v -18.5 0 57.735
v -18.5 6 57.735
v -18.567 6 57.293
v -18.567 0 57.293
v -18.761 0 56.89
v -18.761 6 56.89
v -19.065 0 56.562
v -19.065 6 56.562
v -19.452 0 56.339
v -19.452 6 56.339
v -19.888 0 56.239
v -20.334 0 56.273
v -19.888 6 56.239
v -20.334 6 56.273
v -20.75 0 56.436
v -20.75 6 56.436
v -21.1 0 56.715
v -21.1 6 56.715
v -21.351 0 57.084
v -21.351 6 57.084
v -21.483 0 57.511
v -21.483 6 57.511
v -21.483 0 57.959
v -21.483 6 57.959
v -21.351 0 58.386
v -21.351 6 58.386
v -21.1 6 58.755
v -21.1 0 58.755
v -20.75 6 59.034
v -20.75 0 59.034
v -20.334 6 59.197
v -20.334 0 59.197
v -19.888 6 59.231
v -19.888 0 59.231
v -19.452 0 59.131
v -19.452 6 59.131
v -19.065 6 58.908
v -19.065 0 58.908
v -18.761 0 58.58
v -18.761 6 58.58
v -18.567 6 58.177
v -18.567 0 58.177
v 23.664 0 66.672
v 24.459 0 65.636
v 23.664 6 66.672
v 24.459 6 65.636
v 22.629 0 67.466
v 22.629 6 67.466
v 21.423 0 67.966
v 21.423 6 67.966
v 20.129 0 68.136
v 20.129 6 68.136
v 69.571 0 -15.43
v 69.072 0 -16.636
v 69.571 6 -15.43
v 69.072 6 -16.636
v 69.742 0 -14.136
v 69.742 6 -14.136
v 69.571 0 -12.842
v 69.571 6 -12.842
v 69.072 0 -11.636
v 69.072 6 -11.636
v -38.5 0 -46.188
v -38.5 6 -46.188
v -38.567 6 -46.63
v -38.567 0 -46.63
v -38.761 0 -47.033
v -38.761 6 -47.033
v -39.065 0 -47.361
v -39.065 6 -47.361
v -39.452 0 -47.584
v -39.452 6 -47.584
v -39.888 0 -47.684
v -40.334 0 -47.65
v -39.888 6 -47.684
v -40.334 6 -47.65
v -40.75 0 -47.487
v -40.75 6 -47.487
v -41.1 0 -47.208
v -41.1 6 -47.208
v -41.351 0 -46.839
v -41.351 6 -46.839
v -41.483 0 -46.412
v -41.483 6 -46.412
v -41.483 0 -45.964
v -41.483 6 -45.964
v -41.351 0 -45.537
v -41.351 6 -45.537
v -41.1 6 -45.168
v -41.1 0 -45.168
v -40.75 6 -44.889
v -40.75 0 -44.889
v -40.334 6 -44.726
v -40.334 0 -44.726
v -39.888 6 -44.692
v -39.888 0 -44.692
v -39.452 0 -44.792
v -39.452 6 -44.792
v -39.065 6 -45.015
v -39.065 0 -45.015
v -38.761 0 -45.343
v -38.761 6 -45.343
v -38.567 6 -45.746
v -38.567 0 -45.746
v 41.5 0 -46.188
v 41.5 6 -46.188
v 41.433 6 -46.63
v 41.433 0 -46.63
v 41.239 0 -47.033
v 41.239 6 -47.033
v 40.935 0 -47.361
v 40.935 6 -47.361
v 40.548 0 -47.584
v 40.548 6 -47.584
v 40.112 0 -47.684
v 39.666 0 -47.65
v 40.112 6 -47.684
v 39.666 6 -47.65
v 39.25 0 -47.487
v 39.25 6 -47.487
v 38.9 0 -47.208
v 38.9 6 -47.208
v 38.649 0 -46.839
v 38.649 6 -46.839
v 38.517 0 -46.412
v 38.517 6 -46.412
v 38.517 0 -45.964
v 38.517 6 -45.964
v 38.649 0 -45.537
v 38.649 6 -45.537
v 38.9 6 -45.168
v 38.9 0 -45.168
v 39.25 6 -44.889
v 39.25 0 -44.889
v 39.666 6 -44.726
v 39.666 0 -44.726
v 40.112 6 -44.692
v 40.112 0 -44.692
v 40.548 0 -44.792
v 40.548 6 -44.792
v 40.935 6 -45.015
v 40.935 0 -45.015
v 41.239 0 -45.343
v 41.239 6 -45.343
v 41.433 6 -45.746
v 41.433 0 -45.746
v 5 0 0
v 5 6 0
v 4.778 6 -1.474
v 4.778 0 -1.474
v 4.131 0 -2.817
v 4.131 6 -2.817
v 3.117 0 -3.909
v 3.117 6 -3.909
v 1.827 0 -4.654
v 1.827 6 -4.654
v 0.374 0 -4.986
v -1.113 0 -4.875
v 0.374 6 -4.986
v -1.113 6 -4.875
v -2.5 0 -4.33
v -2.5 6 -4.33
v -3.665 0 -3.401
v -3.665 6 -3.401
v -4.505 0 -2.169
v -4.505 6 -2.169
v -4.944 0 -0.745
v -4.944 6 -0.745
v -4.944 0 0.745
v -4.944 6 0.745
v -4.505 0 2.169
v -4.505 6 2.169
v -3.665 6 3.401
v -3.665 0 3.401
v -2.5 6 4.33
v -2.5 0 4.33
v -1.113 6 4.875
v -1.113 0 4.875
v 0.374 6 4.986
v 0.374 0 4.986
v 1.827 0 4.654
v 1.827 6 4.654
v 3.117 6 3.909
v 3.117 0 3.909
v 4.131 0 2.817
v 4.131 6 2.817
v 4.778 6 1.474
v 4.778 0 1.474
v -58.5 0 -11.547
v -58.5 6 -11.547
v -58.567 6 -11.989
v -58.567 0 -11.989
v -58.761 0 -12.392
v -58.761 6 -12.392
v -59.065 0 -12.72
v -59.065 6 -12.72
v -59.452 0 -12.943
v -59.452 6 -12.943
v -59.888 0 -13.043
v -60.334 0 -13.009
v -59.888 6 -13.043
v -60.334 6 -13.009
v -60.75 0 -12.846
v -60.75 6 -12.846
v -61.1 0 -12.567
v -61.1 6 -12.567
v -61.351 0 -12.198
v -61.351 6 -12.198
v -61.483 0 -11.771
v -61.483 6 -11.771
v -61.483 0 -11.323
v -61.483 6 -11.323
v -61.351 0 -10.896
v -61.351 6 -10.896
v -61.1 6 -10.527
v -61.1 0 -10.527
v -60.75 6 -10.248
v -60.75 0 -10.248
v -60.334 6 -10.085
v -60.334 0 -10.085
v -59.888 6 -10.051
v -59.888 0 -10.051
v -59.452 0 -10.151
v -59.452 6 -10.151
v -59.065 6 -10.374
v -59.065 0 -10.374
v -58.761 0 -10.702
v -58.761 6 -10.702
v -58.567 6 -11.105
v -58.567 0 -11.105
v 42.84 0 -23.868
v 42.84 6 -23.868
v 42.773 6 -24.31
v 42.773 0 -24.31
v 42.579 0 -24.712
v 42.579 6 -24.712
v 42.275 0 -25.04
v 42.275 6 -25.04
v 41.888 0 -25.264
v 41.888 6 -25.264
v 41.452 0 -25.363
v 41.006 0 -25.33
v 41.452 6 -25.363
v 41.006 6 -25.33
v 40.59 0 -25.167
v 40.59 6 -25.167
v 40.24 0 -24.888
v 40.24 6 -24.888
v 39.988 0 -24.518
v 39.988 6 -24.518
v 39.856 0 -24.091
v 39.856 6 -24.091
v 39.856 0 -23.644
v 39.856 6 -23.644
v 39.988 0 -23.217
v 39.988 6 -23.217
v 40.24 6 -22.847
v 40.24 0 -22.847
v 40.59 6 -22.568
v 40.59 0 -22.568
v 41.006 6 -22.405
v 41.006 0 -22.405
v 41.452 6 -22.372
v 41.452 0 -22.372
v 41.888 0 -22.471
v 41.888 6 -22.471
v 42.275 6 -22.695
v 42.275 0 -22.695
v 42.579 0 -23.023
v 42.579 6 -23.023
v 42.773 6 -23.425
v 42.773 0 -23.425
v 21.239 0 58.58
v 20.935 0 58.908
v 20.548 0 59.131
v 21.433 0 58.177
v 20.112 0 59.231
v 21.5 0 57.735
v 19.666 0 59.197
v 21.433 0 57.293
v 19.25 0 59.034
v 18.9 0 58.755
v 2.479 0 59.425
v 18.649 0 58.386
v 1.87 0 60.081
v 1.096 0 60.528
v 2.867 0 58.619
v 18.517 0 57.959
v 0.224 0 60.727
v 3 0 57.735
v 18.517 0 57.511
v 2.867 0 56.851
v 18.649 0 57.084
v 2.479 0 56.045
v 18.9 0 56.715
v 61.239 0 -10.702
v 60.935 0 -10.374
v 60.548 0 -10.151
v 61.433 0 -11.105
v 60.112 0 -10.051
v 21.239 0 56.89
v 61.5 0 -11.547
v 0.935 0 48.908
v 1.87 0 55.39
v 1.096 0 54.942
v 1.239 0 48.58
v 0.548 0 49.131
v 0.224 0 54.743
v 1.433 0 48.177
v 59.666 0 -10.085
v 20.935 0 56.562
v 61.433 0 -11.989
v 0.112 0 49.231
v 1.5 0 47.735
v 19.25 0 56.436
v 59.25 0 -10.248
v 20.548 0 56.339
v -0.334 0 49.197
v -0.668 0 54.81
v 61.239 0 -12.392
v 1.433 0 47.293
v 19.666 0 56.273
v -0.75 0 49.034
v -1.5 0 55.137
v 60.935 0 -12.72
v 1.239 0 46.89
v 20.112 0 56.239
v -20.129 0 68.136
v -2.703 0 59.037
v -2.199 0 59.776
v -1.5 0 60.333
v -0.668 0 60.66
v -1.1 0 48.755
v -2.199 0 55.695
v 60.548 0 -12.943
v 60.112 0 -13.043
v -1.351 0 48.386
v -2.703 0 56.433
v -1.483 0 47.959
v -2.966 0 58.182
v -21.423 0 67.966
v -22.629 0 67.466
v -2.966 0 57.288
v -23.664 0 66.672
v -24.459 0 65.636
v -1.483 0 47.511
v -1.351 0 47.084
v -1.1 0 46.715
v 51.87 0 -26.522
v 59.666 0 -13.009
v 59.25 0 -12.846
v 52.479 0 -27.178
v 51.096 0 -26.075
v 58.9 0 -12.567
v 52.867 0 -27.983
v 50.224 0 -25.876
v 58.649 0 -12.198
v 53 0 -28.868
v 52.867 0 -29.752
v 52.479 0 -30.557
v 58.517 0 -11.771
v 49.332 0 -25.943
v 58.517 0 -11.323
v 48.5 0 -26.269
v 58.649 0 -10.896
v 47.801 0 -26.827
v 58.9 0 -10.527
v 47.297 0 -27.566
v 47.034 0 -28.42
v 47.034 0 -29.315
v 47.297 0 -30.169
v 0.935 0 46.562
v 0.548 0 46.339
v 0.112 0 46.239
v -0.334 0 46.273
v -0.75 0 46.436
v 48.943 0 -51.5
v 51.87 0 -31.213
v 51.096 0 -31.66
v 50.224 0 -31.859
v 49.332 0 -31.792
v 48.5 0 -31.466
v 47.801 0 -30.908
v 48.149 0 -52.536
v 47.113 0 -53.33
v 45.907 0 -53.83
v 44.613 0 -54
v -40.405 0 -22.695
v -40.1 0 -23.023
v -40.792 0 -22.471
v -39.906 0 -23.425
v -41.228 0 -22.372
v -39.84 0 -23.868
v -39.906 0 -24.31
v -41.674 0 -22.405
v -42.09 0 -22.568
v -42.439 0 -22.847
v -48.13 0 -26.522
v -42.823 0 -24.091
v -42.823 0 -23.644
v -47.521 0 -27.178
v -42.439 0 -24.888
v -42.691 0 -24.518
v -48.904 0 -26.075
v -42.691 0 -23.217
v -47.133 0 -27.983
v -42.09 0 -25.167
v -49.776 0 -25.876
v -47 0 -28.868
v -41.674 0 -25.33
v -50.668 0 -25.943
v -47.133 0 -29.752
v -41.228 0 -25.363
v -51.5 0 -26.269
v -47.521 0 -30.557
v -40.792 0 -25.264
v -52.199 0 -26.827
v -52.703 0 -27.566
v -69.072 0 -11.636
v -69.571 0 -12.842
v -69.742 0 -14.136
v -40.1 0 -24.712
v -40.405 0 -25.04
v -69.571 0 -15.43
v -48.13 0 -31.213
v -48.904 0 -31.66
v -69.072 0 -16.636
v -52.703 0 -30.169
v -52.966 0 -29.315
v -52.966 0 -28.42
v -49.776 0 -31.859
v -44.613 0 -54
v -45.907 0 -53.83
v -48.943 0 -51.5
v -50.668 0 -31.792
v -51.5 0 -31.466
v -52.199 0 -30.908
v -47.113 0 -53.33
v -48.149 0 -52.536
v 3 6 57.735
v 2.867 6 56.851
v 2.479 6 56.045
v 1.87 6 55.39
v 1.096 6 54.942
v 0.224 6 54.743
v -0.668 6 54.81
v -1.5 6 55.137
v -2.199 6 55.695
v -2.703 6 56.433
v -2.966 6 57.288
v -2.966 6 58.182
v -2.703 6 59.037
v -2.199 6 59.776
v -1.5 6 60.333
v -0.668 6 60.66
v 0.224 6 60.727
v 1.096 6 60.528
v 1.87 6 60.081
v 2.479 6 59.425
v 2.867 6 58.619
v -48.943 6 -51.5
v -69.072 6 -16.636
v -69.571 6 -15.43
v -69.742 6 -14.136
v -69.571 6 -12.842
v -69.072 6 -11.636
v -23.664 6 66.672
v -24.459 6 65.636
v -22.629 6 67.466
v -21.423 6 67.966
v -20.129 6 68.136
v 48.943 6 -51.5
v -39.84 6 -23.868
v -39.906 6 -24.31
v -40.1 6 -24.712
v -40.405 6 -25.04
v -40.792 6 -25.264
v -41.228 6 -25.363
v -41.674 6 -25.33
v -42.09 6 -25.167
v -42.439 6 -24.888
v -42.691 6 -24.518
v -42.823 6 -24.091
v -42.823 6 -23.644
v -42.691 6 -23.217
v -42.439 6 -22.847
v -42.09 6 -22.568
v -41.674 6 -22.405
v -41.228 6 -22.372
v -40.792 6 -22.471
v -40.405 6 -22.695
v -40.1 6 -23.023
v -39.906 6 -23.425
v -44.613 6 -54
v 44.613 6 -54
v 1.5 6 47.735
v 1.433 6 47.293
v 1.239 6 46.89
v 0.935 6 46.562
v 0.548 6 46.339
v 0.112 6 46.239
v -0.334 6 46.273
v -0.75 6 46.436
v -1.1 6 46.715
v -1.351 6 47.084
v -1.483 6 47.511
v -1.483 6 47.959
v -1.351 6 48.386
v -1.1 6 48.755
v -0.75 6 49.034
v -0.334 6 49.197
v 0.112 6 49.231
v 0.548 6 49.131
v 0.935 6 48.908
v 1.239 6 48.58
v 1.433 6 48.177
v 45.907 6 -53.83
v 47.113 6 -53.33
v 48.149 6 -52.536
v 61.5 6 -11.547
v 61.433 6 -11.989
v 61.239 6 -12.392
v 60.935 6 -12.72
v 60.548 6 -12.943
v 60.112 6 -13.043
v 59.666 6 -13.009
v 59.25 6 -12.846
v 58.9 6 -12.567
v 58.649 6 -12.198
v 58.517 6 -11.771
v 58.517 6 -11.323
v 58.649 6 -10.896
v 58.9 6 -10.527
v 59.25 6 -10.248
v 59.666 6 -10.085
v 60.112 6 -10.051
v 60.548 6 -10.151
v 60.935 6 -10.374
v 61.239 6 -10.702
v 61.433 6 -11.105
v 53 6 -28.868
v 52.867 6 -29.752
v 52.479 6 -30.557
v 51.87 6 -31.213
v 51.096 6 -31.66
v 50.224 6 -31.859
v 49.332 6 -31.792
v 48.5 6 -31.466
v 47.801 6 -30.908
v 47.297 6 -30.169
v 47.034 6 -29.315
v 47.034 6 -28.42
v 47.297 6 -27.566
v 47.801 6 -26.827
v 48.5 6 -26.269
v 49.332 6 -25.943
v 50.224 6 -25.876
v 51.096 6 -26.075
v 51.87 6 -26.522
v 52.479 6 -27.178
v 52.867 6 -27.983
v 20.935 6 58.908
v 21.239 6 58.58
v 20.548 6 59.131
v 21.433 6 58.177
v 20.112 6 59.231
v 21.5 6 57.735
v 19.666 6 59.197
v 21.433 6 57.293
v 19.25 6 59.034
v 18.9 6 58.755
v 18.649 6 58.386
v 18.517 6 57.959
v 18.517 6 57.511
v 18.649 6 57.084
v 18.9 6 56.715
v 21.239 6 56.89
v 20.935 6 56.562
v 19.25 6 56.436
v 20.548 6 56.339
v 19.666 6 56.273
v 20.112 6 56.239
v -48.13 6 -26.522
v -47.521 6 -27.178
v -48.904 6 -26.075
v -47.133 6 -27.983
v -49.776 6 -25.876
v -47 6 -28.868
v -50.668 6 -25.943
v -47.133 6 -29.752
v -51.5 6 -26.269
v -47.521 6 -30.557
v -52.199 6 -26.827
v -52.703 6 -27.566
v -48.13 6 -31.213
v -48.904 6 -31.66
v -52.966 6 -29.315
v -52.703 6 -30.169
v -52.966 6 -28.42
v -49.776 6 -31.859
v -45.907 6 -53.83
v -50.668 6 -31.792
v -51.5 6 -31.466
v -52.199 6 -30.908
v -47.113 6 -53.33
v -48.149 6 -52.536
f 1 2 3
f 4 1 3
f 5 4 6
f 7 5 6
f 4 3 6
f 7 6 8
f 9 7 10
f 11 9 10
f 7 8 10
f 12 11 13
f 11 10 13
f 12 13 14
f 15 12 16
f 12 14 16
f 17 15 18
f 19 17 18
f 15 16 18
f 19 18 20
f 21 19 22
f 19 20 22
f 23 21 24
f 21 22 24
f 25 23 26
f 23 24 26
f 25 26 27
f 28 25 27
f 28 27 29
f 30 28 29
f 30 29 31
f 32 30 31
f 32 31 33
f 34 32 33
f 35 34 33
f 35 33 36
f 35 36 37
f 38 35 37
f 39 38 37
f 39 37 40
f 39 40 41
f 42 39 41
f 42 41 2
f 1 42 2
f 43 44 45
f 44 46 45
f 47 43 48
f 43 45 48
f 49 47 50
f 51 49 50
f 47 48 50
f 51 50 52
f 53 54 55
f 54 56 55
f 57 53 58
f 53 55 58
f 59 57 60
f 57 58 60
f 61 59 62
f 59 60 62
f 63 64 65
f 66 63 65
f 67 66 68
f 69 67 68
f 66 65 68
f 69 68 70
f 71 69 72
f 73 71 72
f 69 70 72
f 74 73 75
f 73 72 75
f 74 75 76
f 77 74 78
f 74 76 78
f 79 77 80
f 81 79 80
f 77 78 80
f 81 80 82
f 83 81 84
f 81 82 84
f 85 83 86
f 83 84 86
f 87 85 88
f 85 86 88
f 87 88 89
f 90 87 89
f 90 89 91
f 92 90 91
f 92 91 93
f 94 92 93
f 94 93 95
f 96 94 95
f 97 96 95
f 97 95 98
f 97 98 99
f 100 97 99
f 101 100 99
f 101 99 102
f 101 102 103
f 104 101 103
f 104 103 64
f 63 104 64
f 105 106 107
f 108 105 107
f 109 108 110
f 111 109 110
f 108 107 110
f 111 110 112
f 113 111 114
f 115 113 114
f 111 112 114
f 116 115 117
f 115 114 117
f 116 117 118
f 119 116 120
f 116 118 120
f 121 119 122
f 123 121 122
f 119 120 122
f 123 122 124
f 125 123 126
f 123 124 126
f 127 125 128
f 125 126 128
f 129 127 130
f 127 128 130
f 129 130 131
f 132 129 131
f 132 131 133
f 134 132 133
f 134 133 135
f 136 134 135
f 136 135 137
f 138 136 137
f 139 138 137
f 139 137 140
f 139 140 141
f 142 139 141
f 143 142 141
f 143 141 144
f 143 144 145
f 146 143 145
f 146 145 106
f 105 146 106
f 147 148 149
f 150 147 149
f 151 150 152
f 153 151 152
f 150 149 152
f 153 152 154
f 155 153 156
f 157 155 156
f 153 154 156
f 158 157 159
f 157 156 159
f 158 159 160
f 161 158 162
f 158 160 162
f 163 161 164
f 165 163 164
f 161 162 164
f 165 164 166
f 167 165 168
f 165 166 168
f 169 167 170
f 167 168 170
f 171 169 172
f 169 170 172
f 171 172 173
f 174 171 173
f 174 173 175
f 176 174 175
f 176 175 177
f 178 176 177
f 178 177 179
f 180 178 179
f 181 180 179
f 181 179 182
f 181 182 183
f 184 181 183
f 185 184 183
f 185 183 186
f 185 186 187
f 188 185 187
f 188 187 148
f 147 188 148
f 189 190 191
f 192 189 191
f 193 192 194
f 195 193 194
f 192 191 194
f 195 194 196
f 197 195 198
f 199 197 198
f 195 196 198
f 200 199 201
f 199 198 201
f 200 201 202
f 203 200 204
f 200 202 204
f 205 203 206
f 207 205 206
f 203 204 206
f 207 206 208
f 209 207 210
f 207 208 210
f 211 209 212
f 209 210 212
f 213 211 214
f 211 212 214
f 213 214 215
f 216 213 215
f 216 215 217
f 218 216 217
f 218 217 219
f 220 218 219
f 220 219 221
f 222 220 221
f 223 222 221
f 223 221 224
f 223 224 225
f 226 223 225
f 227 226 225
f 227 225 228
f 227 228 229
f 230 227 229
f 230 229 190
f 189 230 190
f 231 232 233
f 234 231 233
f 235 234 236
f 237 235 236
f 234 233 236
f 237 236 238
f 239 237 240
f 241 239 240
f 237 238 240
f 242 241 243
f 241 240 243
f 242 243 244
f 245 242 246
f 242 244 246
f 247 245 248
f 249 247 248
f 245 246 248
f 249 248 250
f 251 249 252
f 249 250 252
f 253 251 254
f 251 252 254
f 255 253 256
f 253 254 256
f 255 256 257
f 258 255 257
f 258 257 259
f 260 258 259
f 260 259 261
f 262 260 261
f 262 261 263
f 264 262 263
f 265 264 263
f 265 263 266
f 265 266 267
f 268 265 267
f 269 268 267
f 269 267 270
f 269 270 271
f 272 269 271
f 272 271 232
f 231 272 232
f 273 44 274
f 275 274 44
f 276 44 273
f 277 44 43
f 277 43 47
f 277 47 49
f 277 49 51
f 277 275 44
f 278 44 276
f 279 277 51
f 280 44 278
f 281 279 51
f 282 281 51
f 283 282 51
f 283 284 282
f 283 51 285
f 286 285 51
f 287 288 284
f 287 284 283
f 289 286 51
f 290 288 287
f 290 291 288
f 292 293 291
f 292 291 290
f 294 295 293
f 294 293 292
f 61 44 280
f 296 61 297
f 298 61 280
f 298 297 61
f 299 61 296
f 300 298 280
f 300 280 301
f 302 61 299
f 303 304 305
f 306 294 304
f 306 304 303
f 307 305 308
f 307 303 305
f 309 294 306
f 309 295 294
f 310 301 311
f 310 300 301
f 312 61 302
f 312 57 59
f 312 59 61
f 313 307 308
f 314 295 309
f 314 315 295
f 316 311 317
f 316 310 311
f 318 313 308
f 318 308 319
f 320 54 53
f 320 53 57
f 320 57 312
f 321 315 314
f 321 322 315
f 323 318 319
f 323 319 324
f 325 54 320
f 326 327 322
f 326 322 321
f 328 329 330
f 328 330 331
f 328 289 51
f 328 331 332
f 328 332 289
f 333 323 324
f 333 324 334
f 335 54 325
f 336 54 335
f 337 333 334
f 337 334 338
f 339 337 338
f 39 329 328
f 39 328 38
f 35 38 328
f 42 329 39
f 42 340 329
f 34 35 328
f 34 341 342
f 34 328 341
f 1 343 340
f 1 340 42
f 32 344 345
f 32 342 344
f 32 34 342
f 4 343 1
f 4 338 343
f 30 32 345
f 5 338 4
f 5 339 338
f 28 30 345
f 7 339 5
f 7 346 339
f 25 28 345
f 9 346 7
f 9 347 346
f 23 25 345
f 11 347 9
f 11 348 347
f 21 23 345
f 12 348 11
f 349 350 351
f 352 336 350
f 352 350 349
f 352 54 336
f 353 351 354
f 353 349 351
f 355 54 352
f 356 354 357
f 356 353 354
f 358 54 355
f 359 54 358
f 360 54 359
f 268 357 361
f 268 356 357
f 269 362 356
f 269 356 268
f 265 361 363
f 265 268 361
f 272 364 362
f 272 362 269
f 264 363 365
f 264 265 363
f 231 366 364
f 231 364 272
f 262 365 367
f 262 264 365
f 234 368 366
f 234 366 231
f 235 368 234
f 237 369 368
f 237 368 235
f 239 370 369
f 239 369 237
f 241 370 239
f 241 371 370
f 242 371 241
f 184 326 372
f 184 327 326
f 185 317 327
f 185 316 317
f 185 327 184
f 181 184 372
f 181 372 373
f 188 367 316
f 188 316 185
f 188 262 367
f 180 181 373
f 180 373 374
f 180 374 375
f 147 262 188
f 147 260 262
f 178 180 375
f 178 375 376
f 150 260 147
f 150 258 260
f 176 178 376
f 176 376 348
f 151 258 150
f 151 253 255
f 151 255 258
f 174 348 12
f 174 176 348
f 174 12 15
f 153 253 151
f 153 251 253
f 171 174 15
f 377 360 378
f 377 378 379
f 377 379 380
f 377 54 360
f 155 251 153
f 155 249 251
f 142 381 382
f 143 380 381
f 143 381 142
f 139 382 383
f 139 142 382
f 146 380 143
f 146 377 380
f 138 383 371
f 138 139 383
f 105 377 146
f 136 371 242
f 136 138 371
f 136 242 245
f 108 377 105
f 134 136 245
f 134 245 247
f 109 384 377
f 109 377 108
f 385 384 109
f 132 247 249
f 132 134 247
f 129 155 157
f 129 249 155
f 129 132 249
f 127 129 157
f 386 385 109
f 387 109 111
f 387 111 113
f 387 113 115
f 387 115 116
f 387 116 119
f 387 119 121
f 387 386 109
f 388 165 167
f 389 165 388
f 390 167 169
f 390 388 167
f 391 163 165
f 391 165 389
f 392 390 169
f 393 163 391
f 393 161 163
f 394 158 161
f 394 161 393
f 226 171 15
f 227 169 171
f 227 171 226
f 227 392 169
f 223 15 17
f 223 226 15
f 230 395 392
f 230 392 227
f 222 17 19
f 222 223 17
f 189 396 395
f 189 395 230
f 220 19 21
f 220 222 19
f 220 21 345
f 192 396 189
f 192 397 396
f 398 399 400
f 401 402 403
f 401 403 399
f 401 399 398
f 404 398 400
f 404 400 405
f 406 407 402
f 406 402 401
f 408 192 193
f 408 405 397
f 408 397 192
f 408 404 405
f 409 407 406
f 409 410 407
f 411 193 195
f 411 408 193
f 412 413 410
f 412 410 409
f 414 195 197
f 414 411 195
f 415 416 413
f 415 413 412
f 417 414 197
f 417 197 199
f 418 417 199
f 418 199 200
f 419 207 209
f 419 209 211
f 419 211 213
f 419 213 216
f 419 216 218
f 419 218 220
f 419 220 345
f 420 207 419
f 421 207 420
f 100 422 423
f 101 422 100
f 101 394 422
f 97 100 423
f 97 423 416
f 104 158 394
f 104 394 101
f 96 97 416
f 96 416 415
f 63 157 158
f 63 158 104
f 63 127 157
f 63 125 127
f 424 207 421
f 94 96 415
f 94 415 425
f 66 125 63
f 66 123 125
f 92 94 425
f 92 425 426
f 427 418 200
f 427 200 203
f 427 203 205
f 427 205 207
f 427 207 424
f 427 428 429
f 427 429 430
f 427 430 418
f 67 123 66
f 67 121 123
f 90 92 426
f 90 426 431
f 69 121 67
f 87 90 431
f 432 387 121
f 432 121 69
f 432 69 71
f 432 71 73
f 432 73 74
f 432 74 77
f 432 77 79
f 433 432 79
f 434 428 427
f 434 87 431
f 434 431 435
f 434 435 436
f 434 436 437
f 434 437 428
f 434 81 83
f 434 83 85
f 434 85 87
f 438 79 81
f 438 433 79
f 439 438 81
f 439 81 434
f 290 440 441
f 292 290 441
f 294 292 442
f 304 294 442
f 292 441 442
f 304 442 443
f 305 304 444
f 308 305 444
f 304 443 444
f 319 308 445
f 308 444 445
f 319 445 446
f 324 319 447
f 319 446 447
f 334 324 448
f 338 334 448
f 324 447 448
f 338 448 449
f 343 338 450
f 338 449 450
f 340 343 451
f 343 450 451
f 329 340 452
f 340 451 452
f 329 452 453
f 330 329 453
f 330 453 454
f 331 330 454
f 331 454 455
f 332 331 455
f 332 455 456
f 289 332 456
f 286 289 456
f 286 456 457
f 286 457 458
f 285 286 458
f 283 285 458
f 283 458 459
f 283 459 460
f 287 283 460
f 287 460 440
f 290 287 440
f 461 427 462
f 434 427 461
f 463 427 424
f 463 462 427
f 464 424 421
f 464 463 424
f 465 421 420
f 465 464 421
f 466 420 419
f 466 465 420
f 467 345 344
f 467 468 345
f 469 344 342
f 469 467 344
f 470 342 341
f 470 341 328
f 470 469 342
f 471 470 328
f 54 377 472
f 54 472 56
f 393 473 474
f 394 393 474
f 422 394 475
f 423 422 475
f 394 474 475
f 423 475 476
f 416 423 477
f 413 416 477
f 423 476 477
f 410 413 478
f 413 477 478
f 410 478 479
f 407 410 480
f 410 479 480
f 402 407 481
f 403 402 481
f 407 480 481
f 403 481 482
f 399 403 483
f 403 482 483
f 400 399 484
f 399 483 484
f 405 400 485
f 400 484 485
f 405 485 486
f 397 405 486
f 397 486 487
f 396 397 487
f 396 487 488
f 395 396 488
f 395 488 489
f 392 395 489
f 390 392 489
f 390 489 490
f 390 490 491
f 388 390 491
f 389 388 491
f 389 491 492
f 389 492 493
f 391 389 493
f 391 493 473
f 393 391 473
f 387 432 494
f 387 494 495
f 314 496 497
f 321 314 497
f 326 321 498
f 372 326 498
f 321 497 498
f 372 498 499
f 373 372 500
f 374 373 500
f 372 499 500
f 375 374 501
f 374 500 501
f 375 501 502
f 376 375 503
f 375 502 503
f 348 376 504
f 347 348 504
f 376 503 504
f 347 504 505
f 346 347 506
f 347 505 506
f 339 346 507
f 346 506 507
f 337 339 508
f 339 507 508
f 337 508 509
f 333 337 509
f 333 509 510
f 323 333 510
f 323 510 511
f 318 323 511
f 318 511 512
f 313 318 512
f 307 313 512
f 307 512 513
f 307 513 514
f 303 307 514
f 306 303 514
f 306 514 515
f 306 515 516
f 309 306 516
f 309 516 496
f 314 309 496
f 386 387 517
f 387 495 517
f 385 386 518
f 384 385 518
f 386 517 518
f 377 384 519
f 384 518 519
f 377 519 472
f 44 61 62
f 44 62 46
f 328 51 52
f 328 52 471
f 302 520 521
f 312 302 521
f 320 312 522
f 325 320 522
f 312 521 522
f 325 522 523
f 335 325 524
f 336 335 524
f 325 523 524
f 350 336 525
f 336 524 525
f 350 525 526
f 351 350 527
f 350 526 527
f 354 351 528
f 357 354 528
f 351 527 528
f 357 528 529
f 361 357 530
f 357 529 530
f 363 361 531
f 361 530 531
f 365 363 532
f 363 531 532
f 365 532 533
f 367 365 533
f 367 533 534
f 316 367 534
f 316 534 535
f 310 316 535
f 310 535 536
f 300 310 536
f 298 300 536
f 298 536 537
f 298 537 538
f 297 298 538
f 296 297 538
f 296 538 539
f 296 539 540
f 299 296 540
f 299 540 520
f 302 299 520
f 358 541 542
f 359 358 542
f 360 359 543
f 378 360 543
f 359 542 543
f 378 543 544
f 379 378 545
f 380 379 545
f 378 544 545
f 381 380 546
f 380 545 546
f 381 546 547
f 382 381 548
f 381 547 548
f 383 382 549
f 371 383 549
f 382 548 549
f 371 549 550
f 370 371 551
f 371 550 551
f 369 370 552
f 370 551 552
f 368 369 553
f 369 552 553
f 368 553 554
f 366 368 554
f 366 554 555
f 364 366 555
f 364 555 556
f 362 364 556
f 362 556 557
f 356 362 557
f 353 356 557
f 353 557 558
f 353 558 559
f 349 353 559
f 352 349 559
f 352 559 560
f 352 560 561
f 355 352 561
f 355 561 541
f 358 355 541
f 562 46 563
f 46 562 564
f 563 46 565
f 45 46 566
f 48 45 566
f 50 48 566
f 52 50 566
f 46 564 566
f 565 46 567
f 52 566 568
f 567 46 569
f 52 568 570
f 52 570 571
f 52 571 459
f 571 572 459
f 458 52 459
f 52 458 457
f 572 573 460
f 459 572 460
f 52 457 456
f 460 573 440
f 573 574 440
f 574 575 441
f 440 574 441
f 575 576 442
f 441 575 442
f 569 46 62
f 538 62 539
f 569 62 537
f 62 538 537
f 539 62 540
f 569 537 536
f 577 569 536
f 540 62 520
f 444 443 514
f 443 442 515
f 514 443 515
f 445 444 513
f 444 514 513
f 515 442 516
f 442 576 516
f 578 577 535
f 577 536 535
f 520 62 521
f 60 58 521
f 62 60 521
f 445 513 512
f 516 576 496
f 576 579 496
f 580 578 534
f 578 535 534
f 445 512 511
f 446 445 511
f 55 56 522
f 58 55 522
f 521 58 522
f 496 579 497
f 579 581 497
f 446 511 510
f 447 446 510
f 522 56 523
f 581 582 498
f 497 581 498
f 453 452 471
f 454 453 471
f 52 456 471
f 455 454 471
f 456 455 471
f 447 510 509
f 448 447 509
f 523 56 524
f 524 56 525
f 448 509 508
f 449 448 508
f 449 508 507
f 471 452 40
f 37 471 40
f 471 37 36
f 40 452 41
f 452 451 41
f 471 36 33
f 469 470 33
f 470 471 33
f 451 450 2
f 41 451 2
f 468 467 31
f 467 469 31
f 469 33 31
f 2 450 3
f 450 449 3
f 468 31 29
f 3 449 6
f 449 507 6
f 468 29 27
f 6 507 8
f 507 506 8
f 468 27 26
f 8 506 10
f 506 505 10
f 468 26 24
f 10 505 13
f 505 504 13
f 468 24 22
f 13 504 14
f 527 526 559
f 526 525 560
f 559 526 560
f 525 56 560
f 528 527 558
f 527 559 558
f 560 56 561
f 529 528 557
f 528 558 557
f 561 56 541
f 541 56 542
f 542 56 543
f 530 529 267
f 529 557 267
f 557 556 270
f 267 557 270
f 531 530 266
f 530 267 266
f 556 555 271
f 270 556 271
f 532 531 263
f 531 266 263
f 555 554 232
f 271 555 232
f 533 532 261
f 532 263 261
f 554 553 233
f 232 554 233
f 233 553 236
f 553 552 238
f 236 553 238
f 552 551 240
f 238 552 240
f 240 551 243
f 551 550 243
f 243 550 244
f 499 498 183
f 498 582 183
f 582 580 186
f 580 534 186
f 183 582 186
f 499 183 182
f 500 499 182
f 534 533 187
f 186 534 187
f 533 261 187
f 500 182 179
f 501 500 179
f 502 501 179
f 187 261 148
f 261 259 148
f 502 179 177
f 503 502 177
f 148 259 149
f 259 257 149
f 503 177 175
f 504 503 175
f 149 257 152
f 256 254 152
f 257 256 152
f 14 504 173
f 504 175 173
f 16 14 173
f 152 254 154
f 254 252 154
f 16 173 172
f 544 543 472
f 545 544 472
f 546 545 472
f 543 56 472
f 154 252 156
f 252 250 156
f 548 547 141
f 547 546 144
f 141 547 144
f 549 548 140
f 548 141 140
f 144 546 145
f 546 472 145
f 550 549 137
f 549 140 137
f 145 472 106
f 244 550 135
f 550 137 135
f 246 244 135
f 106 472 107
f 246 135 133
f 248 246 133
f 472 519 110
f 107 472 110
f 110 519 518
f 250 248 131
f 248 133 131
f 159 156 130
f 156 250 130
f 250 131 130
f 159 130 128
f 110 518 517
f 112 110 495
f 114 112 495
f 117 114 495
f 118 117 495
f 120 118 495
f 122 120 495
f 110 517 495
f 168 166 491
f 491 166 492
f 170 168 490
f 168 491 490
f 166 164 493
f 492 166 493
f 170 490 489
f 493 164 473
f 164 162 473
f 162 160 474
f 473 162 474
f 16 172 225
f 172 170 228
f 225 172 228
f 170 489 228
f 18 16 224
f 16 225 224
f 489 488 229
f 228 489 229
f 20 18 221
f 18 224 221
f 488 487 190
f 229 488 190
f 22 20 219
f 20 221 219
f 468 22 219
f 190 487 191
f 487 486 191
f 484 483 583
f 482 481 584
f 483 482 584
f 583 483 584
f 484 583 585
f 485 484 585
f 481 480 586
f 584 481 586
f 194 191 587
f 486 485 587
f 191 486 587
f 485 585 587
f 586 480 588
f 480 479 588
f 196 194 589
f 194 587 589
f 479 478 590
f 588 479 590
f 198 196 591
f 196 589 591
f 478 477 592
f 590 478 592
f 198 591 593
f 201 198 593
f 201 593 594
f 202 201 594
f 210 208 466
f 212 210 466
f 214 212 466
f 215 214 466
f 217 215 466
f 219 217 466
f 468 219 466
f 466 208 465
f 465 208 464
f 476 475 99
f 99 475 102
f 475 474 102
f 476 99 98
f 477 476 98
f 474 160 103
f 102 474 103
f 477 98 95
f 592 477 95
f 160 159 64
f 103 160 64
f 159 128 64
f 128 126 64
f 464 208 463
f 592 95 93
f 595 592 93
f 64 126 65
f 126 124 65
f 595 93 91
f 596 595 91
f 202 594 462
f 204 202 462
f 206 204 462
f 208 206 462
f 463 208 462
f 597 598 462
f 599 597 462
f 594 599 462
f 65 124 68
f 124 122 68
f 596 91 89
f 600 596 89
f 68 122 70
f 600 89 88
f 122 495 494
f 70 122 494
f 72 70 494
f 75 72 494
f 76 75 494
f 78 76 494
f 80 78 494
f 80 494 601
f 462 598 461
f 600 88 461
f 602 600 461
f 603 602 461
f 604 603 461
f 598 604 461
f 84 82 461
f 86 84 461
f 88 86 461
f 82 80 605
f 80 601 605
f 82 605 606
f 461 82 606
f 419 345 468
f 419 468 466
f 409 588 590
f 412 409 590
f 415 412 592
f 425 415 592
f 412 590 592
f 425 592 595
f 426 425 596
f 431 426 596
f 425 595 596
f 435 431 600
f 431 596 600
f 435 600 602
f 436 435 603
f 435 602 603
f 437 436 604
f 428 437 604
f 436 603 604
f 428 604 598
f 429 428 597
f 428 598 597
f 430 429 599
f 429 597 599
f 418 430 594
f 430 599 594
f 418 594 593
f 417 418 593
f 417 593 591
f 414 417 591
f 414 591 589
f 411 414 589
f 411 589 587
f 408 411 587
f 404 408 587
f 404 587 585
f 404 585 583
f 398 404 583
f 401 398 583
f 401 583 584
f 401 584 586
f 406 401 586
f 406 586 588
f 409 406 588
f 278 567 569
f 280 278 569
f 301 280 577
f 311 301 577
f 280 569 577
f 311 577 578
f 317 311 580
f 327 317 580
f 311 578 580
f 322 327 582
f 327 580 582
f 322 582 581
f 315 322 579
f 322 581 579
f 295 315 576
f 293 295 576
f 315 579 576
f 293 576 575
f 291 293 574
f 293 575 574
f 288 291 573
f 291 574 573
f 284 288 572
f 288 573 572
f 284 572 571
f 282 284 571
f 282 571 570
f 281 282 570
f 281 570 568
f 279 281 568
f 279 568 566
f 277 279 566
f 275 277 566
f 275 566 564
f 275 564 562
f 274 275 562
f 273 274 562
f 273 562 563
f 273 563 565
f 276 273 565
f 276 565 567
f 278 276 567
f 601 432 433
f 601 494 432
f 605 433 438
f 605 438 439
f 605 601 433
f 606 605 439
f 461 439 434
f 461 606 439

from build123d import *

# Parameters (mm, degrees)
BOSS_EXTRUDE1_DEPTH = 6
SKETCH2_R           = 3
SKETCH2_R_2         = 1.5
CUT_EXTRUDE1_DEPTH  = 7
FILLET1_R           = 5
SKETCH4_R           = 5
CUT_EXTRUDE3_DEPTH  = 7


with BuildPart() as part:
    # Sketch1 → Boss-Extrude1 (new body)
    with BuildSketch(Plane(origin=(0, 0, 0), x_dir=(1, 0, 0), z_dir=(0, 1, 0))):
        Polygon((-47.5, 54), (47.5, 54), (70.515371804, 14.13620668), (23.015371804, -68.13620668), (-23.015371804, -68.13620668), (-70.515371804, 14.13620668), align=None)
    extrude(amount=BOSS_EXTRUDE1_DEPTH)

    # Sketch2 → Cut-Extrude1 (cut, through all)
    with BuildSketch(Plane(origin=(0, 6, 0), x_dir=(1, 0, 0), z_dir=(0, 1, 0))):
        with Locations((50, 28.867513459)):
            Circle(SKETCH2_R)
        with Locations((-50, 28.867513459)):
            Circle(SKETCH2_R)
        with Locations((0, -57.735026919)):
            Circle(SKETCH2_R)
        with Locations((-20, -57.735026919)):
            Circle(SKETCH2_R_2)
        with Locations((20, -57.735026919)):
            Circle(SKETCH2_R_2)
        with Locations((0, -47.735026919)):
            Circle(SKETCH2_R_2)
        with Locations((-60, 11.547005384)):
            Circle(SKETCH2_R_2)
        with Locations((-41.339745962, 23.867513459)):
            Circle(SKETCH2_R_2)
        with Locations((-40, 46.188021535)):
            Circle(SKETCH2_R_2)
        with Locations((40, 46.188021535)):
            Circle(SKETCH2_R_2)
        with Locations((41.339745962, 23.867513459)):
            Circle(SKETCH2_R_2)
        with Locations((60, 11.547005384)):
            Circle(SKETCH2_R_2)
    extrude(amount=-CUT_EXTRUDE1_DEPTH, mode=Mode.SUBTRACT)

    # Fillet1
    fillet1_edges = [part.edges().sort_by_distance(p)[0] for p in [
        (-47.5, 3, -54),
        (47.5, 3, -54),
        (70.515371804, 3, -14.13620668),
        (23.015371804, 3, 68.13620668),
        (-23.015371804, 3, 68.13620668),
        (-70.515371804, 3, -14.13620668),
    ]]
    fillet(fillet1_edges, radius=FILLET1_R)

    # Sketch4 → Cut-Extrude3 (cut, through all)
    with BuildSketch(Plane(origin=(0, 6, 0), x_dir=(1, 0, 0), z_dir=(0, 1, 0))):
        Circle(SKETCH4_R)
    extrude(amount=-CUT_EXTRUDE3_DEPTH, mode=Mode.SUBTRACT)


solid = part.part
